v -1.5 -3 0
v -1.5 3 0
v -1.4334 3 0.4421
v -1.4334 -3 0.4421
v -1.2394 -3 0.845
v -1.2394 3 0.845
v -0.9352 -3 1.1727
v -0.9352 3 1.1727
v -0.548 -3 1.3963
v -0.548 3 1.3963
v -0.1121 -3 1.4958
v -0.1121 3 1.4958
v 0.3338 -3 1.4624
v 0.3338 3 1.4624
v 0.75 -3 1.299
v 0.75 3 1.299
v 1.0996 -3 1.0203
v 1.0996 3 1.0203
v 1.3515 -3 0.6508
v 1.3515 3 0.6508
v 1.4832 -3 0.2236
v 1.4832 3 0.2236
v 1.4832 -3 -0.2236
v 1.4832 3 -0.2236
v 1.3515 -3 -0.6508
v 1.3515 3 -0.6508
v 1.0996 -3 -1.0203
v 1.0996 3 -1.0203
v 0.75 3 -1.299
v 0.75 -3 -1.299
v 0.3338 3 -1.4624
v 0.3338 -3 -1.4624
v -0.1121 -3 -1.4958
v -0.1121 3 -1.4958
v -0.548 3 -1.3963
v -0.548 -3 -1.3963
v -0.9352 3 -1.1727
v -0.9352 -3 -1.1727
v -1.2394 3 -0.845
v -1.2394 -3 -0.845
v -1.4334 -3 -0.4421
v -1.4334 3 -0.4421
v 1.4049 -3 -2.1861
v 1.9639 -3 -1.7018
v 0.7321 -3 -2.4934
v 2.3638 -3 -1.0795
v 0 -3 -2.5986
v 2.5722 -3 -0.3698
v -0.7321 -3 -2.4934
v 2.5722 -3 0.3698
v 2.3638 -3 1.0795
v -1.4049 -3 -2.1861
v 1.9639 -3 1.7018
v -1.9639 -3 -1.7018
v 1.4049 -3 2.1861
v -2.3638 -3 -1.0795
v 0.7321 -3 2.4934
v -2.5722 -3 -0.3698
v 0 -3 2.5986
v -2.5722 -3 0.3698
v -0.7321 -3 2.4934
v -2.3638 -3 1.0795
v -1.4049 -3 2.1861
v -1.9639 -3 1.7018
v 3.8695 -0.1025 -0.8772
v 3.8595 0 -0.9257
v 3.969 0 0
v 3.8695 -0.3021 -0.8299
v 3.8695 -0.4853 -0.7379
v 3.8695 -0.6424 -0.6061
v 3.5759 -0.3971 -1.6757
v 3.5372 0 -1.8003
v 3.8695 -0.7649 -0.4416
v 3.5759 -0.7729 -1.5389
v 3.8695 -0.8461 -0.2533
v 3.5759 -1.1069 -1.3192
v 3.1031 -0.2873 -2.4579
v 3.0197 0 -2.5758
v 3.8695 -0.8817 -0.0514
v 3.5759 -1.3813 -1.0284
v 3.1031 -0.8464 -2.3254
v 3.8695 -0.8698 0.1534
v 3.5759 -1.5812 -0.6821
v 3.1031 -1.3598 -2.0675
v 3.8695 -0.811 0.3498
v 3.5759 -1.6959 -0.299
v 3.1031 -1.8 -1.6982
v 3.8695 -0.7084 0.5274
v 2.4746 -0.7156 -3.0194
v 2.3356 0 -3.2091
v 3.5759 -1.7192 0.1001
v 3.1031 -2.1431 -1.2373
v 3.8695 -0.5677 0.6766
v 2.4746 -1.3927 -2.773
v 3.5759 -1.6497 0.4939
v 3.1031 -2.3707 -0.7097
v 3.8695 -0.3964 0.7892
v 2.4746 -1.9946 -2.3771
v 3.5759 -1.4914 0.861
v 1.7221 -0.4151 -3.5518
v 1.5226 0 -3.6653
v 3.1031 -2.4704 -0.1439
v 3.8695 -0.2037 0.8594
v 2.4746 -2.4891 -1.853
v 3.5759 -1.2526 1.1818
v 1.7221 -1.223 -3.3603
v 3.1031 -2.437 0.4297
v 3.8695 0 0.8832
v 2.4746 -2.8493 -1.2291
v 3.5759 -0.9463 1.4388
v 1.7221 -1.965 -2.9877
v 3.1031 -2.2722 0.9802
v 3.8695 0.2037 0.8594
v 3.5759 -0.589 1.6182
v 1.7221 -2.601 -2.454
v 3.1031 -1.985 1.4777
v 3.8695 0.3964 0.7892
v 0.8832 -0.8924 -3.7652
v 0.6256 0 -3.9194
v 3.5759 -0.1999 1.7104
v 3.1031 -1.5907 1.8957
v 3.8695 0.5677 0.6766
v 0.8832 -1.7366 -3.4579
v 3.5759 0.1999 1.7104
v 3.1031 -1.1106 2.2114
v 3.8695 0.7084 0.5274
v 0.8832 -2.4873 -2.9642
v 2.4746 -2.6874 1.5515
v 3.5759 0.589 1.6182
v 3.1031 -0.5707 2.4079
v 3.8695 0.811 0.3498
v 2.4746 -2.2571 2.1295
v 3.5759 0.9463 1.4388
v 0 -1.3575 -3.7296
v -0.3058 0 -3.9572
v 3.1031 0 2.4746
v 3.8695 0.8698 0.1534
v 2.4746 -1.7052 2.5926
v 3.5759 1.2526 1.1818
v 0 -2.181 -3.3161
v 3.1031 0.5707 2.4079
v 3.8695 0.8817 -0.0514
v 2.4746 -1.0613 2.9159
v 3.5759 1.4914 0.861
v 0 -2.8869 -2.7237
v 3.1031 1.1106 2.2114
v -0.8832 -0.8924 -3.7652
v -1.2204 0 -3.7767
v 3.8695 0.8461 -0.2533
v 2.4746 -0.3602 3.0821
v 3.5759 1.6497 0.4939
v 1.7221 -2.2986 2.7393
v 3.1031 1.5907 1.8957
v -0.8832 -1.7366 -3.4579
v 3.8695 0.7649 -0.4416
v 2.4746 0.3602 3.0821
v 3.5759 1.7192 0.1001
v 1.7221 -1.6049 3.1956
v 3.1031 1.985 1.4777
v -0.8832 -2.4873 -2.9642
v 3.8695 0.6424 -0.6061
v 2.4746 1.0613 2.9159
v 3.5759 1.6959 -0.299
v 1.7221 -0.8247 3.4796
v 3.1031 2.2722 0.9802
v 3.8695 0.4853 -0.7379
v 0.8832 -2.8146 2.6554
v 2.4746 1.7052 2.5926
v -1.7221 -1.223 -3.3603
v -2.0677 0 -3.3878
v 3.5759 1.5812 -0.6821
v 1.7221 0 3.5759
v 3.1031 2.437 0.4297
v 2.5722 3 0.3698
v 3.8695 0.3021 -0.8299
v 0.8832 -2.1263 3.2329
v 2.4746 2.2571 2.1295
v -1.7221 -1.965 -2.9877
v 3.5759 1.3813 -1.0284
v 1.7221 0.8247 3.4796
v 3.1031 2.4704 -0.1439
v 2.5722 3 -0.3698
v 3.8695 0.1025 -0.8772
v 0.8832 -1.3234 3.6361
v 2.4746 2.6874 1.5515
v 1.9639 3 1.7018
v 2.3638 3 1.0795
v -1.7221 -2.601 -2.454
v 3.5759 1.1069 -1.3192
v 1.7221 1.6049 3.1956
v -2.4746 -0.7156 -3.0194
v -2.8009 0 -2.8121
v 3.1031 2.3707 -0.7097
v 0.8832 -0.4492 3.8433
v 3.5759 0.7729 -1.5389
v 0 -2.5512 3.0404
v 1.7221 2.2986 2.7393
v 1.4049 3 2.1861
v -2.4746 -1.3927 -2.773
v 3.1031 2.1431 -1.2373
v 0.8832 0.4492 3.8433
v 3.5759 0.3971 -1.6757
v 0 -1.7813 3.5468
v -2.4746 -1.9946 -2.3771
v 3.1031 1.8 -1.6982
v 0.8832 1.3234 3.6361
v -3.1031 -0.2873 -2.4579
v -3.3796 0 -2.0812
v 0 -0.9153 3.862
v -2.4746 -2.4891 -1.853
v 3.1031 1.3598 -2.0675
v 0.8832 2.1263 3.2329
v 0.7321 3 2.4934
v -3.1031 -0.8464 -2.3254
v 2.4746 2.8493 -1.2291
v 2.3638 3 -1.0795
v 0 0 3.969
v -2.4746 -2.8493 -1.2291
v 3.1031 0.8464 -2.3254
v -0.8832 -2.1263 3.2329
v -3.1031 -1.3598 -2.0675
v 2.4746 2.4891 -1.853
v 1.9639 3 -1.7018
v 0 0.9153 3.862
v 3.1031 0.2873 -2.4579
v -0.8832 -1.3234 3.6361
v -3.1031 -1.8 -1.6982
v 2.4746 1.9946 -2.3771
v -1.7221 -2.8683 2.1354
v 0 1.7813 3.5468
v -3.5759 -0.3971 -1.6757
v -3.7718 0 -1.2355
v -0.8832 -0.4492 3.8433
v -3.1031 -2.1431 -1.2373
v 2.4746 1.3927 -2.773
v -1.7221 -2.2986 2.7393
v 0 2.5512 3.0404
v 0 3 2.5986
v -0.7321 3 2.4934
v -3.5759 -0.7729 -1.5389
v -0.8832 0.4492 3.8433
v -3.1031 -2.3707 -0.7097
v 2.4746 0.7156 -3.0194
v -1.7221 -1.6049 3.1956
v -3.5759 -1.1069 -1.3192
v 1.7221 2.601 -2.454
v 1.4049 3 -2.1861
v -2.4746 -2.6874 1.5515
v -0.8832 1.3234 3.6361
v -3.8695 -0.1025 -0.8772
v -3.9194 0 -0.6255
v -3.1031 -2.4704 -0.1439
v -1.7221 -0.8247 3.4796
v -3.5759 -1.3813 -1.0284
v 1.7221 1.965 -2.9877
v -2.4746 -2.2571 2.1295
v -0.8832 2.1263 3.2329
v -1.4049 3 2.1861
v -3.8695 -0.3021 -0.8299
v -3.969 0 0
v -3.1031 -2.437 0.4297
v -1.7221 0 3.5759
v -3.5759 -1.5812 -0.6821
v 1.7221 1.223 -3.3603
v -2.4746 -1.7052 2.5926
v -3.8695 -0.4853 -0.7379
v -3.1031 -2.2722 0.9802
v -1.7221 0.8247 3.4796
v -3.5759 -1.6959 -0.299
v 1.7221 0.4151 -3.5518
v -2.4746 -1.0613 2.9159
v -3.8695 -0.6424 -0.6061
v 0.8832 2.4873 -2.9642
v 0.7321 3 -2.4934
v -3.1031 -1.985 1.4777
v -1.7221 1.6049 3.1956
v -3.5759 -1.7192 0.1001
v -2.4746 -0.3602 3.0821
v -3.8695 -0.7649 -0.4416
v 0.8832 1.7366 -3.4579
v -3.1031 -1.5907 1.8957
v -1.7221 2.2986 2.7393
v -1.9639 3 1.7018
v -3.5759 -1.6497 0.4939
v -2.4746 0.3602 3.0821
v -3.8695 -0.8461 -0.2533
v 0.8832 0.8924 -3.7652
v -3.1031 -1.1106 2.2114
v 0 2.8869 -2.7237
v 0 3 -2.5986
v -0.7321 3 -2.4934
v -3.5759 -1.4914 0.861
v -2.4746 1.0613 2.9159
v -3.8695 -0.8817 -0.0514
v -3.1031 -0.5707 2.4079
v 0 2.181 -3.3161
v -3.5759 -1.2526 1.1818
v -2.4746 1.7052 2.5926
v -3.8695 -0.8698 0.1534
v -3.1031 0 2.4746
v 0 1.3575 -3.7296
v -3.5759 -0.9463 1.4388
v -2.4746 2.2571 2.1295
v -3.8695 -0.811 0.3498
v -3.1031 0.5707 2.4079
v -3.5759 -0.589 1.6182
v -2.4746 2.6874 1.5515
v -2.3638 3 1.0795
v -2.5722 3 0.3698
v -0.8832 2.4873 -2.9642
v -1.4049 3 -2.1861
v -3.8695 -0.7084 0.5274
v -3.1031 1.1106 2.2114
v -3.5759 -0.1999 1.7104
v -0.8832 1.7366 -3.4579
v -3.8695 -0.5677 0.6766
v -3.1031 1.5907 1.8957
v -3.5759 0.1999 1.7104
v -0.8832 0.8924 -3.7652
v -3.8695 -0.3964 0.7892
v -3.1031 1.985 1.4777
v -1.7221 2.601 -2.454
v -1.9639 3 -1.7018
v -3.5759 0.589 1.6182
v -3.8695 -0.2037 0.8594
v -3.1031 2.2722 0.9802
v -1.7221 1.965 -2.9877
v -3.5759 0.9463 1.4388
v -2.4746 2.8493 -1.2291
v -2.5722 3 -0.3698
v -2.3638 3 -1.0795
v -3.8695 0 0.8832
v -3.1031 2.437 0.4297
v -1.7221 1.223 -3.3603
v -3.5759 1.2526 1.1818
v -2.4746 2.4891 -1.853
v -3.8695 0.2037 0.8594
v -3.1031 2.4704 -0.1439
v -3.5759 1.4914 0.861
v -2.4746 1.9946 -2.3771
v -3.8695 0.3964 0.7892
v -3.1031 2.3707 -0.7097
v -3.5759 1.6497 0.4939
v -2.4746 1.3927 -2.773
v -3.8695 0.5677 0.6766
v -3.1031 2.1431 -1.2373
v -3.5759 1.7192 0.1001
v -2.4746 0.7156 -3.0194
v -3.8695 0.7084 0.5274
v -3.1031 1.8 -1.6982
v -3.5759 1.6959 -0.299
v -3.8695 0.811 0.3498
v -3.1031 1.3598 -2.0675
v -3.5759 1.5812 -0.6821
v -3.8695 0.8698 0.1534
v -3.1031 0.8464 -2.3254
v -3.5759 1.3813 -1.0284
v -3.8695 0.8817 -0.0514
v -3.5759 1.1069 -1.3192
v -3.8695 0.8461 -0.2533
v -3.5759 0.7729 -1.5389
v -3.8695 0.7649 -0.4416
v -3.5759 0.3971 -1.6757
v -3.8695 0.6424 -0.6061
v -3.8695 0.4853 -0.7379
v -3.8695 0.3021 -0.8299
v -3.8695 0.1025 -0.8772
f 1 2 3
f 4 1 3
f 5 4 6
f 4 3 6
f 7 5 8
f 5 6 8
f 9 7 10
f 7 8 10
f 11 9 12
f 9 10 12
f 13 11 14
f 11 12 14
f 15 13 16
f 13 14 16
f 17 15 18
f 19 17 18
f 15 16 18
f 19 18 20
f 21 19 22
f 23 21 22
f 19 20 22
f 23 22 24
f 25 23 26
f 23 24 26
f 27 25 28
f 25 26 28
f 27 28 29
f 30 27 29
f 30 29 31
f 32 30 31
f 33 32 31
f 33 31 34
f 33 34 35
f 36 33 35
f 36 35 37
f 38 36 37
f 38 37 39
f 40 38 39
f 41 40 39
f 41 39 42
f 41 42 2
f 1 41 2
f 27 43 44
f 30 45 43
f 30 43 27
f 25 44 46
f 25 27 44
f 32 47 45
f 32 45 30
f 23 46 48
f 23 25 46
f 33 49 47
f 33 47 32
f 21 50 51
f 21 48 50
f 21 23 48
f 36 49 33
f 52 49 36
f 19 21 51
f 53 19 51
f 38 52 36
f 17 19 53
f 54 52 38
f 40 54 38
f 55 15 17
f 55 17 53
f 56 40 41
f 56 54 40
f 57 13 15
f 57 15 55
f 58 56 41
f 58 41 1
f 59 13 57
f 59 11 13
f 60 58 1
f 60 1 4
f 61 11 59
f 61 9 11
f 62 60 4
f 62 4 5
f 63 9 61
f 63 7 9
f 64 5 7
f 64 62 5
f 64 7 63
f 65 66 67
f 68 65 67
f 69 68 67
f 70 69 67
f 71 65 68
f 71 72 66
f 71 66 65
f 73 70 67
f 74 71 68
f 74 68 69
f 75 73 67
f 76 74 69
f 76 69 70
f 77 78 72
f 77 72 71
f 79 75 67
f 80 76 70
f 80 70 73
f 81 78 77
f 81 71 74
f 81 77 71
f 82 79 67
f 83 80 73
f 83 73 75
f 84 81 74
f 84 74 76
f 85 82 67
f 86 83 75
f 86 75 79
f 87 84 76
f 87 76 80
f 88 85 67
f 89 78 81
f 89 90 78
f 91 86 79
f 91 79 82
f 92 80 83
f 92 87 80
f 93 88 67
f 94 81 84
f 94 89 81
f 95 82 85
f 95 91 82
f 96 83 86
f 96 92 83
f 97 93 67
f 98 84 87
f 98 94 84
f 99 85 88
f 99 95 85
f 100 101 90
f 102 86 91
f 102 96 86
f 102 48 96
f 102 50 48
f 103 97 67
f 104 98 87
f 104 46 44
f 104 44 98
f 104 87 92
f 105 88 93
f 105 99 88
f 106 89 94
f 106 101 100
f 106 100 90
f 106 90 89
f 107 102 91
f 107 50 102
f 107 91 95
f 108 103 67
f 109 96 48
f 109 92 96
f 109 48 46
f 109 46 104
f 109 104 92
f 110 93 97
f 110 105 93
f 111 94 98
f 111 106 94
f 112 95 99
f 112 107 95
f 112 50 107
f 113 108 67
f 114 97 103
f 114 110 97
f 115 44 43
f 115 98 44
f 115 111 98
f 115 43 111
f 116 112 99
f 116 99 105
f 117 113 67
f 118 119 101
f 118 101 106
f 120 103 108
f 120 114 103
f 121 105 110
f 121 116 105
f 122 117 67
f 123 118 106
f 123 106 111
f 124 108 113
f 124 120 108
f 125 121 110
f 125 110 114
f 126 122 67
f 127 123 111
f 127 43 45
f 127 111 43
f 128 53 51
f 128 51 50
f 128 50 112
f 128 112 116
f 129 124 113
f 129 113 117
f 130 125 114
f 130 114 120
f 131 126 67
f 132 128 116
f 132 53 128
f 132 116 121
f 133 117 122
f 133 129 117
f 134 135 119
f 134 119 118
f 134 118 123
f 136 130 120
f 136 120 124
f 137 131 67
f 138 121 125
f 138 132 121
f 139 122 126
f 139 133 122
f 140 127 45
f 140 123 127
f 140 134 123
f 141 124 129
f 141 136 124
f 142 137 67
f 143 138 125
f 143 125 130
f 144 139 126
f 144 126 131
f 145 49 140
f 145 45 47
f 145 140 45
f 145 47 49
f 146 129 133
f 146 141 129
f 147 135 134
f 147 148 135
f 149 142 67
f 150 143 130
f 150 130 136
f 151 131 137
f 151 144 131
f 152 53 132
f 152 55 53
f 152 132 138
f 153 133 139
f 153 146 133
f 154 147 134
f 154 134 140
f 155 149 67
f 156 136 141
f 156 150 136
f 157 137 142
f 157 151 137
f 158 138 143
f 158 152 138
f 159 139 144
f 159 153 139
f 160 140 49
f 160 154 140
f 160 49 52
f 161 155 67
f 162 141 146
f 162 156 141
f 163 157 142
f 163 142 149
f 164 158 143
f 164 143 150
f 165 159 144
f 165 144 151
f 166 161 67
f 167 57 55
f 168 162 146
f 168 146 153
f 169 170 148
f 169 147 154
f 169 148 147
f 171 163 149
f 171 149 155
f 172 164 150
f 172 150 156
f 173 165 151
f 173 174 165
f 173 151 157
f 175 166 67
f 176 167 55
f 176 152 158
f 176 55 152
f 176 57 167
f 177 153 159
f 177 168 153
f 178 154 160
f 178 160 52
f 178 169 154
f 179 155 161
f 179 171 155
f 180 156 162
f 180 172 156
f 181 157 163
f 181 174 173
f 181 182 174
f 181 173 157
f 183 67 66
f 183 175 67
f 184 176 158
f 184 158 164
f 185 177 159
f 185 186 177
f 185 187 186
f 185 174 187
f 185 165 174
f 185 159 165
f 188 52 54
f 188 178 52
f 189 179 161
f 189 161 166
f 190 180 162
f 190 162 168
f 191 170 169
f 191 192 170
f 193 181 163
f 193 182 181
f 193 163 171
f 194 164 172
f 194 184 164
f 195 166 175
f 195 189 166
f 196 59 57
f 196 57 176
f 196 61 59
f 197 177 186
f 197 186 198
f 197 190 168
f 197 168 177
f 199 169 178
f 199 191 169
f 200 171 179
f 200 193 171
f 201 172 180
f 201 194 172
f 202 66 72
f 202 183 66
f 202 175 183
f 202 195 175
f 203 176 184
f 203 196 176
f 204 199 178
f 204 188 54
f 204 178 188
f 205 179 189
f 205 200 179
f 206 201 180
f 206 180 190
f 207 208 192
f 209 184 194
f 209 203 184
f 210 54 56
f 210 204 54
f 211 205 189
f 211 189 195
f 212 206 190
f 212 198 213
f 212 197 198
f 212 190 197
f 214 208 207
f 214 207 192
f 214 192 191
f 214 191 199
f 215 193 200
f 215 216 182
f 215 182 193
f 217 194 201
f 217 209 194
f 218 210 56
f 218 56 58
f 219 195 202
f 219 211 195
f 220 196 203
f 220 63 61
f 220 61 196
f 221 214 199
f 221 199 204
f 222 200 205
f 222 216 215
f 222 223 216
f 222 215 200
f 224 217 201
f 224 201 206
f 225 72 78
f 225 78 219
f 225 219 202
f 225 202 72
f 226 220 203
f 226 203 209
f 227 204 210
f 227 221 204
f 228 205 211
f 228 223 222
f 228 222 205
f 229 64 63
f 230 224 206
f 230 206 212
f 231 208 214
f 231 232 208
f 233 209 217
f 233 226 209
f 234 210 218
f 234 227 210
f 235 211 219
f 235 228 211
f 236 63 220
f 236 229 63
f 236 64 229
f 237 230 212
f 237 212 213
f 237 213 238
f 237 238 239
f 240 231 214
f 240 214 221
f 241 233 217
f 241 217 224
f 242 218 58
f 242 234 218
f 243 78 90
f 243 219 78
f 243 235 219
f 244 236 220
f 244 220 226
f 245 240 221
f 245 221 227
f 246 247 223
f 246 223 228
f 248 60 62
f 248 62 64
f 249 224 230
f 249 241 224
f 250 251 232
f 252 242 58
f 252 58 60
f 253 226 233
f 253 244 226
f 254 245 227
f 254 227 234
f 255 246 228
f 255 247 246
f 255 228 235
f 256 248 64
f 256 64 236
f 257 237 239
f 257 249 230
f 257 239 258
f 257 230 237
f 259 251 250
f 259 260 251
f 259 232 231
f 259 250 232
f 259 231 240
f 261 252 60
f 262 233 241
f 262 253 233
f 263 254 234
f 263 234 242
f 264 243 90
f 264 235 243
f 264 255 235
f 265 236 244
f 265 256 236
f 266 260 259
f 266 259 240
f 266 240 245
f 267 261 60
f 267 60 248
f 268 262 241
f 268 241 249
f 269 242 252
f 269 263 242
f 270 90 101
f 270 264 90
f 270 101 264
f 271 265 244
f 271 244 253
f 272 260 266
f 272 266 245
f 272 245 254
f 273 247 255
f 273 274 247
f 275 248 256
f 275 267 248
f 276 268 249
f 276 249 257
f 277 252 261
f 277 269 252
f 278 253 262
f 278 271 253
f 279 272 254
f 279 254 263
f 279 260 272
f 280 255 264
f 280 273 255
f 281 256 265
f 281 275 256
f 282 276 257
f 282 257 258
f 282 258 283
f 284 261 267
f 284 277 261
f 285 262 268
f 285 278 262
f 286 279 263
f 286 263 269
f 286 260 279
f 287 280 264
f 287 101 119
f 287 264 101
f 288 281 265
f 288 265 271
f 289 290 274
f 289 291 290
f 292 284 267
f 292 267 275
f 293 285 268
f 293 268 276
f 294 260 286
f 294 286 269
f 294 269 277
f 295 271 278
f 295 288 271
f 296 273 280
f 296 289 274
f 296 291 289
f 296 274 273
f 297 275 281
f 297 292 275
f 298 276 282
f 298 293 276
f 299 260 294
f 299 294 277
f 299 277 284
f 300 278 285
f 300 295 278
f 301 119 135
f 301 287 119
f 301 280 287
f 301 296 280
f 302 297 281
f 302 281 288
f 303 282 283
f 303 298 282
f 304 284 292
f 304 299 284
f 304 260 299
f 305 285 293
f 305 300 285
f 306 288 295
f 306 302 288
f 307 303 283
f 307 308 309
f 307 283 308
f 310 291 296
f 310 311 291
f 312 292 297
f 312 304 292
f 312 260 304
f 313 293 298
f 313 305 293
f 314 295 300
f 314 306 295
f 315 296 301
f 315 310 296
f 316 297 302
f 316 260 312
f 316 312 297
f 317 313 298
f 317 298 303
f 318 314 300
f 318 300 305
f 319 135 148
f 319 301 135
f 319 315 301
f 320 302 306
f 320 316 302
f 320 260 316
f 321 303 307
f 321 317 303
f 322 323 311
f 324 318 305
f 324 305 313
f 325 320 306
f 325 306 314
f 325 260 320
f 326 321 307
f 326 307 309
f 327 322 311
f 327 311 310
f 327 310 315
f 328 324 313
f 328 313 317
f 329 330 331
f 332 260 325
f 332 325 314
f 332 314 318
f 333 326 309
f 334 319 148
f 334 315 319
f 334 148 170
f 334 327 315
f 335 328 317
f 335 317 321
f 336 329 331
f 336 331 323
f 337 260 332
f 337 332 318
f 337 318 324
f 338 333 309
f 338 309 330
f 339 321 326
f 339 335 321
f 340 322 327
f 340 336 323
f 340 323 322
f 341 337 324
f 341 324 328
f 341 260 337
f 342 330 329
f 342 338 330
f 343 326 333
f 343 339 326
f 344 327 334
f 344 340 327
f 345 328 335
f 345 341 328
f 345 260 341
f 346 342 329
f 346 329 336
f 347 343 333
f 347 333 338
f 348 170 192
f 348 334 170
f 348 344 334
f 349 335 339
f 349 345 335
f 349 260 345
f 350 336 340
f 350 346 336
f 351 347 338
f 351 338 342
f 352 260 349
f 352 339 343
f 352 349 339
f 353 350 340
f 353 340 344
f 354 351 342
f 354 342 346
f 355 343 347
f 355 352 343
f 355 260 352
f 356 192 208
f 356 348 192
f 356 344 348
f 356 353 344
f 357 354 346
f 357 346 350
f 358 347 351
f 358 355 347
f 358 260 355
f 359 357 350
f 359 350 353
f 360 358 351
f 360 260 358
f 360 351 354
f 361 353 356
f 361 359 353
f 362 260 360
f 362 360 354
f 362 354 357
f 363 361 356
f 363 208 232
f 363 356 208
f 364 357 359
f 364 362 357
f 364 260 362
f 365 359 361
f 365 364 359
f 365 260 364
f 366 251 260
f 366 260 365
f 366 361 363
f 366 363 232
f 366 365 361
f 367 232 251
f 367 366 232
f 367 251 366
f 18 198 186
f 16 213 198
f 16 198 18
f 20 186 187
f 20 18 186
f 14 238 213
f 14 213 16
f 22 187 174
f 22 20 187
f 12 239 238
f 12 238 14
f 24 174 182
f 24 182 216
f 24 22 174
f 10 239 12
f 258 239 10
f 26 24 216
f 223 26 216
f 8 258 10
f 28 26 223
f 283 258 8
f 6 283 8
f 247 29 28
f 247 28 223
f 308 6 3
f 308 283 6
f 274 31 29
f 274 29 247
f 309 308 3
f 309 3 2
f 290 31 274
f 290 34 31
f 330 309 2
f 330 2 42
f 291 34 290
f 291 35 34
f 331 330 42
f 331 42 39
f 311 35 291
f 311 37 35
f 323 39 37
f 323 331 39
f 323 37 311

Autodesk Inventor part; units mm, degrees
ref_plane "YZ Plane" through (0, 0, 0) normal (1, 0, 0) x (0, 1, 0)
ref_plane "XZ Plane" through (0, 0, 0) normal (0, 1, 0) x (-1, 0, 0)
ref_plane "XY Plane" through (0, 0, 0) normal (0, 0, 1) x (1, 0, 0)
sketch "Эскиз1" plane through (0, 0, 0) normal (0, 1, 0) x (-1, 0, 0)
  circle A0 centre (0, 0) radius 3.969
  line L0 (3.969, 0) -> (-3.969, 0)
  dimension "d0" = 7.938
  dimension "d1" = 7.938
revolve "Вращение1" add sketch "Эскиз1" angle 360 about axis through (-3.969, 0, 0) along (1, 0, 0) picked at (1.323, -1.2297) contours A0 L0
sketch "Эскиз2" plane through (0, 0, 0) normal (0, 1, 0) x (-1, 0, 0)
  circle A0 centre (0, 0) radius 1.5
  dimension "d3" = 3
extrude "Выдавливание1" cut sketch "Эскиз2" along normal mid plane 10
sketch "Эскиз3" plane through (0, 0, 0) normal (1, 0, 0) x (0, 1, 0)
  line L0 (13, 10) -> (3, 10)
  line L1 (3, 10) -> (3, -10)
  line L2 (3, -10) -> (13, -10)
  line L3 (13, -10) -> (13, 10)
  point P0 (0, 0)
  dimension "d6" = 3
  dimension "d7" = 20
  dimension "d8" = 10
  dimension "d9" = 10
extrude "Выдавливание2" cut sketch "Эскиз3" along normal through all both and the other way through all
mirror "Зеркальное отражение1" about plane through (0, 0, 0) normal (0, 1, 0) of "Выдавливание2"
properties part number "Ball" material "Нержавеющая сталь"
